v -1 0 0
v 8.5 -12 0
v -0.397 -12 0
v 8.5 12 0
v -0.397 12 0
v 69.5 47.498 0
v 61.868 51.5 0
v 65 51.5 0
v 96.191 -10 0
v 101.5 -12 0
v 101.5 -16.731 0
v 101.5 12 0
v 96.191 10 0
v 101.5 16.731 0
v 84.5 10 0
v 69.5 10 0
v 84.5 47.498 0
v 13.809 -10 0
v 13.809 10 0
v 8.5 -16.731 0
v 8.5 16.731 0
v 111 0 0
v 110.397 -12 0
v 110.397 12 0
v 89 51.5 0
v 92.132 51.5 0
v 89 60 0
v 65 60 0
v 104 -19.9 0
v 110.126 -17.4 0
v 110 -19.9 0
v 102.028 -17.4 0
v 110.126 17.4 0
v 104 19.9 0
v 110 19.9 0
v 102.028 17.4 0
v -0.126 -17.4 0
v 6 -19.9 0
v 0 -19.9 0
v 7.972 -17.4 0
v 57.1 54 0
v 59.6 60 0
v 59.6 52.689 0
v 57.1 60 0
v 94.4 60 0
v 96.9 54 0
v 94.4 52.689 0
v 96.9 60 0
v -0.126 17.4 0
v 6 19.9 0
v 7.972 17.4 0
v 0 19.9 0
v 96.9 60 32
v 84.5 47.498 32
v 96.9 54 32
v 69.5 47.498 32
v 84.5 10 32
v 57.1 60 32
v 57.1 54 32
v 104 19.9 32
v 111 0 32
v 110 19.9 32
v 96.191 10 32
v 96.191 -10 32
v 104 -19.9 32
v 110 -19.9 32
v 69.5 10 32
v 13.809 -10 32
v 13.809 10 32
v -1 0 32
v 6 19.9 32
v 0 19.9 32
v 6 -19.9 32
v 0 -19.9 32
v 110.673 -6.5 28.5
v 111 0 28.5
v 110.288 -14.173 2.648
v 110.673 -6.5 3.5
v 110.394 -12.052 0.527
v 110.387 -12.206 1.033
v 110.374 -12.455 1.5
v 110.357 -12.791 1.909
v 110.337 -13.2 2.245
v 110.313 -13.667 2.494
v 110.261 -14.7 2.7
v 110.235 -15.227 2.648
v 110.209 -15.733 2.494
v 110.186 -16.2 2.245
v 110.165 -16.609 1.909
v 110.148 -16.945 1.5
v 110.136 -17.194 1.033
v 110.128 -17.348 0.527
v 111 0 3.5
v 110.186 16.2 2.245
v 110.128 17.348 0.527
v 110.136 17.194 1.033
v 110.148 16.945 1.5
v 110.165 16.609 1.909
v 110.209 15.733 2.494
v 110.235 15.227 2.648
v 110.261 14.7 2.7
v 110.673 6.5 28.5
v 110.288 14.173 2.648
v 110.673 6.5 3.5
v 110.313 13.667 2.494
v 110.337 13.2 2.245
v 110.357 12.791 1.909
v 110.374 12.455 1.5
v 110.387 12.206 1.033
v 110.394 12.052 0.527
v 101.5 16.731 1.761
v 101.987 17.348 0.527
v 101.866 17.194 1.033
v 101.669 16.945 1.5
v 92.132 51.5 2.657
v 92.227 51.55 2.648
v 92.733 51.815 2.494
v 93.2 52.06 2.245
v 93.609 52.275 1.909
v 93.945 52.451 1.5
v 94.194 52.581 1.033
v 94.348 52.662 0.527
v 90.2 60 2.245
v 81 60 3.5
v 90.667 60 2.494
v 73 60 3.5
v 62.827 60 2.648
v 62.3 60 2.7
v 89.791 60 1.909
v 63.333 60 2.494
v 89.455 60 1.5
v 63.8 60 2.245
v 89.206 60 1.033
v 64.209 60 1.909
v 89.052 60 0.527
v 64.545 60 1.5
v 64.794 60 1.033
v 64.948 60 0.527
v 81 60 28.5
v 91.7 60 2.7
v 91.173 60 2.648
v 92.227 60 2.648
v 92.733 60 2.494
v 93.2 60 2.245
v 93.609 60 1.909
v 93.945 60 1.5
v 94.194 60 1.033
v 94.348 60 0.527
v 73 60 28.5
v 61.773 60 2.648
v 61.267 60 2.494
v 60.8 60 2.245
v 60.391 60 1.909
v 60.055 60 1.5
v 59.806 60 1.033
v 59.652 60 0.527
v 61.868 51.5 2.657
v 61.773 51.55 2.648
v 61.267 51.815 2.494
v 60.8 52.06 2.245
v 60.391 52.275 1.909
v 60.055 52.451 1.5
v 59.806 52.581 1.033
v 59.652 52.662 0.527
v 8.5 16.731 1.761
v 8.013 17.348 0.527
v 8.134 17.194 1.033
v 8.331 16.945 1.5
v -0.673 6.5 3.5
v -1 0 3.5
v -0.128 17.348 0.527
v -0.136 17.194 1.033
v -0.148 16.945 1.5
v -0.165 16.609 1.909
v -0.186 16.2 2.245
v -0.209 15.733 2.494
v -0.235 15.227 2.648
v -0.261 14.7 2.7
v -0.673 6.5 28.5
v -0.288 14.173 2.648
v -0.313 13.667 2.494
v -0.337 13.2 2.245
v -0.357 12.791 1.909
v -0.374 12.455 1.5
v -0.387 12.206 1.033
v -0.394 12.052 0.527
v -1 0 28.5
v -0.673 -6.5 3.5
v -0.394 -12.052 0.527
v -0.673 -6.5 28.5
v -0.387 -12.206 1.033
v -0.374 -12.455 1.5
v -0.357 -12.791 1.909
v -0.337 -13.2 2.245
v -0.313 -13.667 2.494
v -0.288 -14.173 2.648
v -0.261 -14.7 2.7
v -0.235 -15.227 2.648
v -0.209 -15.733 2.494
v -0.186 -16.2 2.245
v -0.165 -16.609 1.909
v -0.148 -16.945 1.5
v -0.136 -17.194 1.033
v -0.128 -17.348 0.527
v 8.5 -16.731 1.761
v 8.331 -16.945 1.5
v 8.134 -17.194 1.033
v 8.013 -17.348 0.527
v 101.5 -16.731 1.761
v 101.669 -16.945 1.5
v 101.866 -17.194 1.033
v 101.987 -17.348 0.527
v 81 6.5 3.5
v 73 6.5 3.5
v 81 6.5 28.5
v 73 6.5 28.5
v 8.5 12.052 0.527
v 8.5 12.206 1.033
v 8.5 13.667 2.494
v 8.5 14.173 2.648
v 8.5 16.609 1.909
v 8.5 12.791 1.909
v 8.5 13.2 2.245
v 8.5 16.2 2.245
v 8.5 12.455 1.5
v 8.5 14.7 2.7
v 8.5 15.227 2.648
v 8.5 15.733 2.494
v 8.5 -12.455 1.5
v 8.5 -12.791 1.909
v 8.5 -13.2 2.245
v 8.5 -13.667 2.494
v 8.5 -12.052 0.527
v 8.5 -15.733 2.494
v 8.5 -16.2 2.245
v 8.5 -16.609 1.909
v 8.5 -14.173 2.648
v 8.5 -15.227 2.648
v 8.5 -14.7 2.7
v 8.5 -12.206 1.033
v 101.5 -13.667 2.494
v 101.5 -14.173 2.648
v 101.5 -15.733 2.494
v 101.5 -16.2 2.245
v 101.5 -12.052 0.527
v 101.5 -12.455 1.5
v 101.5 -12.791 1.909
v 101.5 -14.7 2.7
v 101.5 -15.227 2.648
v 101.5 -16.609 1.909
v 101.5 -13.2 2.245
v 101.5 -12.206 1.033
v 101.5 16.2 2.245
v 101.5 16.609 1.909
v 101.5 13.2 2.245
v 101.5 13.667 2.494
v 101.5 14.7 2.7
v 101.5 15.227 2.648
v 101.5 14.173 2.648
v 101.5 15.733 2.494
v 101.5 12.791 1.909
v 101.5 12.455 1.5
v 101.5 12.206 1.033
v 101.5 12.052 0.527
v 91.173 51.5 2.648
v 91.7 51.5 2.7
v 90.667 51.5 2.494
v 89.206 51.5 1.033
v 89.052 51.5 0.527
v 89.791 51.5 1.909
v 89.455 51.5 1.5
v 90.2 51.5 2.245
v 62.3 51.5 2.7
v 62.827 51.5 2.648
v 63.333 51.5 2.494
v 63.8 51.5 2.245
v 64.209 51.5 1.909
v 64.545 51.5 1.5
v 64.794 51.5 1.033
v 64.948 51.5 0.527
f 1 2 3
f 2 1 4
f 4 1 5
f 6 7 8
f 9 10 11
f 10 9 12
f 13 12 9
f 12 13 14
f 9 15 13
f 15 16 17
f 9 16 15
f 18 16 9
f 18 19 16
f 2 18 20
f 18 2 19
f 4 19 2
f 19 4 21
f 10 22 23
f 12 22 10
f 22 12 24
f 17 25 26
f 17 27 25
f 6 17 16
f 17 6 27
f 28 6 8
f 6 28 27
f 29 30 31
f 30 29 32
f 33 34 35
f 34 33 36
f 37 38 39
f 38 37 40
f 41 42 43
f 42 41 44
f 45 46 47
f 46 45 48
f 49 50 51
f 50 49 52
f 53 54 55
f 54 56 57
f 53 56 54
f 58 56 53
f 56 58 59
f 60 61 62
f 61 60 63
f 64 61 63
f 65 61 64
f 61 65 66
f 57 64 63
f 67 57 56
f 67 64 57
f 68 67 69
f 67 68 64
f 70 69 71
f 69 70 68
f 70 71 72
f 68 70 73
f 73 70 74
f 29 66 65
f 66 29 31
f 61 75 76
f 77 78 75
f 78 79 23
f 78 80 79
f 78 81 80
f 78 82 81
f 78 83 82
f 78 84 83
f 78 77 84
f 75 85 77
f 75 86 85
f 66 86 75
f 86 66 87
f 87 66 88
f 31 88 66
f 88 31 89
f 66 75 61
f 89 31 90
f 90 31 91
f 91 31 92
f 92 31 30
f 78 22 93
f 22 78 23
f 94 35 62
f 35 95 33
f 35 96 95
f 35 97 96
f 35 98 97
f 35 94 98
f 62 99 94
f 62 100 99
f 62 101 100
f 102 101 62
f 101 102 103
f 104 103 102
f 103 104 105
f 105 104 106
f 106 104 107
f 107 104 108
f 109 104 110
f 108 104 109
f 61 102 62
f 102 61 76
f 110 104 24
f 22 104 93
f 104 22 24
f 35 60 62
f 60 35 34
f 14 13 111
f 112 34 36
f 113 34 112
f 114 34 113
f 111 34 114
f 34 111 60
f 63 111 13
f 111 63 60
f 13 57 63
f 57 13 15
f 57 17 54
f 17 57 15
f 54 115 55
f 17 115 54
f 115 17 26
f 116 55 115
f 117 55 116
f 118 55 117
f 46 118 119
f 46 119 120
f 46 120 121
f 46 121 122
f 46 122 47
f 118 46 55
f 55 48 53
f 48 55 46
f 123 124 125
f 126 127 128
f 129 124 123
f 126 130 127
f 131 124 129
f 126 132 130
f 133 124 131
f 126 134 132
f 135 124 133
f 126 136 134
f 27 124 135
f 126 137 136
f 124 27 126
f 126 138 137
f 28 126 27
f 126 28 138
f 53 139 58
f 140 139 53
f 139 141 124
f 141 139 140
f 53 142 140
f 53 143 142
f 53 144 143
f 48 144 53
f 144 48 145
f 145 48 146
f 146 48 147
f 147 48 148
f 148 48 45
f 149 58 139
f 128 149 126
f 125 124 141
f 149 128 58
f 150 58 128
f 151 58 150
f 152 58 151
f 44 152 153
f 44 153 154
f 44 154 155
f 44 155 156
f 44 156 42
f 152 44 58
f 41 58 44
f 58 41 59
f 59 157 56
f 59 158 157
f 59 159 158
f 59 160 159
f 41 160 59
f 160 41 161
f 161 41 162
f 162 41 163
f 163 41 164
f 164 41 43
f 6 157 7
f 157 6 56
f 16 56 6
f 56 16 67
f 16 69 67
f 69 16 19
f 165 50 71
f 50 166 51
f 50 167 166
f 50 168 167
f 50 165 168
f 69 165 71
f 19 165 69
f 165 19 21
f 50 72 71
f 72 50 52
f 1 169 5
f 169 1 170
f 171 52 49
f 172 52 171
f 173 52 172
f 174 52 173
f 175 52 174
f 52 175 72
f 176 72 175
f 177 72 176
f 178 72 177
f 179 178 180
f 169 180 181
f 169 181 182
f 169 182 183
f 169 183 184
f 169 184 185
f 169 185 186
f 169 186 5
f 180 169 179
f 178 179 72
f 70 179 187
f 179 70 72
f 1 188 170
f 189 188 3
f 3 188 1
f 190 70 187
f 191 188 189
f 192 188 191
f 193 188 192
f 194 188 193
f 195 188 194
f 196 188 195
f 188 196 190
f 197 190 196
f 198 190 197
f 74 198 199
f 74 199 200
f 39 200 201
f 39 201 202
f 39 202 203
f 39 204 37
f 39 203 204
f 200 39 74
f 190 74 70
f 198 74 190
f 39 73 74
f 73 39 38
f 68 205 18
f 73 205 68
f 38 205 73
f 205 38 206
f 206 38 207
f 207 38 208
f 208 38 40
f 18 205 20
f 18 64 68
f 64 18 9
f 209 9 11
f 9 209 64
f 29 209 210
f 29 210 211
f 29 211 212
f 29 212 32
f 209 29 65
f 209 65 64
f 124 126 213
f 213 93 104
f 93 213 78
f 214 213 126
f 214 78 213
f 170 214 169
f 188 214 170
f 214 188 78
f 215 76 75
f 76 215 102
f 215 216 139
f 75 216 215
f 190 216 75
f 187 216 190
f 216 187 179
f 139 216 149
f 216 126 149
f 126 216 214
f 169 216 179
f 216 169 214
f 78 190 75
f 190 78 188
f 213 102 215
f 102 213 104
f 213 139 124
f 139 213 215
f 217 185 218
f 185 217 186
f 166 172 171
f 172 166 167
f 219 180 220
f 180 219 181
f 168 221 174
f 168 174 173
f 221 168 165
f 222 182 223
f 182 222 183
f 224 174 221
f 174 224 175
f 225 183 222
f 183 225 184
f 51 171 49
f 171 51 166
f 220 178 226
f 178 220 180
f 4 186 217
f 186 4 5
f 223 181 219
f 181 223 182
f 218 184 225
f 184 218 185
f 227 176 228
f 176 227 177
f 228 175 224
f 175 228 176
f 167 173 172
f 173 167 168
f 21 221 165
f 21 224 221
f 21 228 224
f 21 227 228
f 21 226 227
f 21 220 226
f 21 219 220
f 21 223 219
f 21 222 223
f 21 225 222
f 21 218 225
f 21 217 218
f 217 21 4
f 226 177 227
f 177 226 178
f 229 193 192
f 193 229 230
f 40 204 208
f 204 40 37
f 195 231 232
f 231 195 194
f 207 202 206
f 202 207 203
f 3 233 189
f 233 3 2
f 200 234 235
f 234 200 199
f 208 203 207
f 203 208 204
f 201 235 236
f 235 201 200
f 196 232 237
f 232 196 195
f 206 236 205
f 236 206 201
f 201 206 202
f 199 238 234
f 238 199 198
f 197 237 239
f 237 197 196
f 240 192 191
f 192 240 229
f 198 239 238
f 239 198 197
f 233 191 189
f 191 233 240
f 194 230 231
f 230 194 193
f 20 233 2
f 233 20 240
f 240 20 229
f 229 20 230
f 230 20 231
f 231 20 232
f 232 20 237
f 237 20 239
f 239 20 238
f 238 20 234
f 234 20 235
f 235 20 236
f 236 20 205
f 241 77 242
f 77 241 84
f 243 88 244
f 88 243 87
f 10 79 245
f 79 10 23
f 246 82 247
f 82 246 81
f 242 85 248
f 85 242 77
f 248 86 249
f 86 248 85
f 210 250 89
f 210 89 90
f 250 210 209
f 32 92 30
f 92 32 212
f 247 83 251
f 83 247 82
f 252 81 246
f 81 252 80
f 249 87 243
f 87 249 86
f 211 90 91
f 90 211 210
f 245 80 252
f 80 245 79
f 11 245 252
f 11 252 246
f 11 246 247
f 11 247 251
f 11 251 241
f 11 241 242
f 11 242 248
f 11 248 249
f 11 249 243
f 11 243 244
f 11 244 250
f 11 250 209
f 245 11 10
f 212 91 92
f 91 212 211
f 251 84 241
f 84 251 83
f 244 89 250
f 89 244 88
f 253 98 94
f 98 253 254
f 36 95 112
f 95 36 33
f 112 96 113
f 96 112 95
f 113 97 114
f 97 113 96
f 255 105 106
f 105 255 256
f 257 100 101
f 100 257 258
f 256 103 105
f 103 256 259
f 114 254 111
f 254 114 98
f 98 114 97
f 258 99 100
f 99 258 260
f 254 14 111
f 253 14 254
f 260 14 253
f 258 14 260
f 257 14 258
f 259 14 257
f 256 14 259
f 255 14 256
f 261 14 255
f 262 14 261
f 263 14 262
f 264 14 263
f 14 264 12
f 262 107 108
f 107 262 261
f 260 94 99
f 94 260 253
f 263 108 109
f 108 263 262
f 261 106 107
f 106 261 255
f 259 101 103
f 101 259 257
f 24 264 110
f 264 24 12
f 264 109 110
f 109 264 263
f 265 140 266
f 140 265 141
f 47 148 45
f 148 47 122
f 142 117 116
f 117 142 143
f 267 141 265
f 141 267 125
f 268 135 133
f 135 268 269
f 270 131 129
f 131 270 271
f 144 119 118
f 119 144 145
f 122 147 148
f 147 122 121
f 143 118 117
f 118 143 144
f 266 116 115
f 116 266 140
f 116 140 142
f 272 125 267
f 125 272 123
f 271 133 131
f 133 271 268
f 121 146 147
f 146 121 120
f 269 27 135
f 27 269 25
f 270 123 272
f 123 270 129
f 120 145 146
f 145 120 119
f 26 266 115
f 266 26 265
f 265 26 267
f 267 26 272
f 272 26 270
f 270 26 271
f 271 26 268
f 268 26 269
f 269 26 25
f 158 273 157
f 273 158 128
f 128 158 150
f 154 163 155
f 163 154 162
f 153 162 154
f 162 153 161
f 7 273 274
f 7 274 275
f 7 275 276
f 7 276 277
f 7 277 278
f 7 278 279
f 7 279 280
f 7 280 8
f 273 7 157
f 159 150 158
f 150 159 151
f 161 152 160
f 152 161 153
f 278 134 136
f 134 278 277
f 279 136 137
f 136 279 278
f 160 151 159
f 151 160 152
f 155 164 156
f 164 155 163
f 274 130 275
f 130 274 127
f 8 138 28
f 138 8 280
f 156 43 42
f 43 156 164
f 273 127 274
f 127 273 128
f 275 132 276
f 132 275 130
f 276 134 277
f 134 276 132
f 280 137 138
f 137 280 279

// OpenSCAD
$fn = 32;

// ----------------------------------------------------------------------
// Air duct: 20 mm duct, 3.5 mm wall, 32 mm across
// ----------------------------------------------------------------------

// --- parameters (mm) ---
duct_r = 10;              // duct core radius
duct_d = 20;              // duct core diameter
wall = 3.5;               // duct wall thickness
height = 32;              // duct width (extrusion height)
port_r = 19.9;            // port flange half width
port_d = 39.8;            // port flange width
port_t = 6;               // port flange thickness
bolt_d = 5.4;             // port bolt holes
bolt_offset = 14.7;       // bolt hole offset from the port axis
branch_r = 7.5;           // branch core radius
branch_d = 15;            // branch core diameter
branch_len = 60;          // branch length from the run axis

difference() {
  /* outer hull chain: tube with a flat flange plate at every port */
  linear_extrude(height = 32) {
    hull() {
      polygon([[0, -19.9], [0, 19.9], [6, 19.9], [6, -19.9]]);
      translate([9, 0]) circle(r = 10);
    }
    hull() {
      translate([9, 0]) circle(r = 10);
      translate([33, 0]) circle(r = 10);
    }
    hull() {
      translate([33, 0]) circle(r = 10);
      translate([77, 0]) circle(r = 10);
    }
    hull() {
      translate([77, 0]) circle(r = 10);
      translate([101, 0]) circle(r = 10);
    }
    hull() {
      translate([101, 0]) circle(r = 10);
      polygon([[110, 19.9], [110, -19.9], [104, -19.9], [104, 19.9]]);
    }
    hull() {
      translate([77, 0]) circle(r = 7.5);
      translate([77, 33]) circle(r = 7.5);
    }
    hull() {
      translate([77, 33]) circle(r = 7.5);
      translate([77, 52]) circle(r = 7.5);
    }
    hull() {
      translate([77, 52]) circle(r = 7.5);
      polygon([[57.1, 60], [96.9, 60], [96.9, 54], [57.1, 54]]);
    }
  }
  /* air passage: the same chain inset by the wall, 5 mm proud of the ports */
  translate([0, 0, 3.5]) linear_extrude(height = 25) {
    hull() {
      translate([-5, 0]) circle(r = 6.5);
      translate([33, 0]) circle(r = 6.5);
    }
    hull() {
      translate([33, 0]) circle(r = 6.5);
      translate([77, 0]) circle(r = 6.5);
    }
    hull() {
      translate([77, 0]) circle(r = 6.5);
      translate([115, 0]) circle(r = 6.5);
    }
    hull() {
      translate([77, 0]) circle(r = 4);
      translate([77, 33]) circle(r = 4);
    }
    hull() {
      translate([77, 33]) circle(r = 4);
      translate([77, 65]) circle(r = 4);
    }
  }
  translate([0, 0]) rotate([0, 0, -90]) translate([-14.7, -2.5]) rotate([-90, 0, 0]) cylinder(h = 11, d = 5.4);
  translate([0, 0]) rotate([0, 0, -90]) translate([14.7, -2.5]) rotate([-90, 0, 0]) cylinder(h = 11, d = 5.4);
  translate([110, 0]) rotate([0, 0, 90]) translate([-14.7, -2.5]) rotate([-90, 0, 0]) cylinder(h = 11, d = 5.4);
  translate([110, 0]) rotate([0, 0, 90]) translate([14.7, -2.5]) rotate([-90, 0, 0]) cylinder(h = 11, d = 5.4);
  translate([77, 60]) rotate([0, 0, 180]) translate([-14.7, -2.5]) rotate([-90, 0, 0]) cylinder(h = 11, d = 5.4);
  translate([77, 60]) rotate([0, 0, 180]) translate([14.7, -2.5]) rotate([-90, 0, 0]) cylinder(h = 11, d = 5.4);
}
